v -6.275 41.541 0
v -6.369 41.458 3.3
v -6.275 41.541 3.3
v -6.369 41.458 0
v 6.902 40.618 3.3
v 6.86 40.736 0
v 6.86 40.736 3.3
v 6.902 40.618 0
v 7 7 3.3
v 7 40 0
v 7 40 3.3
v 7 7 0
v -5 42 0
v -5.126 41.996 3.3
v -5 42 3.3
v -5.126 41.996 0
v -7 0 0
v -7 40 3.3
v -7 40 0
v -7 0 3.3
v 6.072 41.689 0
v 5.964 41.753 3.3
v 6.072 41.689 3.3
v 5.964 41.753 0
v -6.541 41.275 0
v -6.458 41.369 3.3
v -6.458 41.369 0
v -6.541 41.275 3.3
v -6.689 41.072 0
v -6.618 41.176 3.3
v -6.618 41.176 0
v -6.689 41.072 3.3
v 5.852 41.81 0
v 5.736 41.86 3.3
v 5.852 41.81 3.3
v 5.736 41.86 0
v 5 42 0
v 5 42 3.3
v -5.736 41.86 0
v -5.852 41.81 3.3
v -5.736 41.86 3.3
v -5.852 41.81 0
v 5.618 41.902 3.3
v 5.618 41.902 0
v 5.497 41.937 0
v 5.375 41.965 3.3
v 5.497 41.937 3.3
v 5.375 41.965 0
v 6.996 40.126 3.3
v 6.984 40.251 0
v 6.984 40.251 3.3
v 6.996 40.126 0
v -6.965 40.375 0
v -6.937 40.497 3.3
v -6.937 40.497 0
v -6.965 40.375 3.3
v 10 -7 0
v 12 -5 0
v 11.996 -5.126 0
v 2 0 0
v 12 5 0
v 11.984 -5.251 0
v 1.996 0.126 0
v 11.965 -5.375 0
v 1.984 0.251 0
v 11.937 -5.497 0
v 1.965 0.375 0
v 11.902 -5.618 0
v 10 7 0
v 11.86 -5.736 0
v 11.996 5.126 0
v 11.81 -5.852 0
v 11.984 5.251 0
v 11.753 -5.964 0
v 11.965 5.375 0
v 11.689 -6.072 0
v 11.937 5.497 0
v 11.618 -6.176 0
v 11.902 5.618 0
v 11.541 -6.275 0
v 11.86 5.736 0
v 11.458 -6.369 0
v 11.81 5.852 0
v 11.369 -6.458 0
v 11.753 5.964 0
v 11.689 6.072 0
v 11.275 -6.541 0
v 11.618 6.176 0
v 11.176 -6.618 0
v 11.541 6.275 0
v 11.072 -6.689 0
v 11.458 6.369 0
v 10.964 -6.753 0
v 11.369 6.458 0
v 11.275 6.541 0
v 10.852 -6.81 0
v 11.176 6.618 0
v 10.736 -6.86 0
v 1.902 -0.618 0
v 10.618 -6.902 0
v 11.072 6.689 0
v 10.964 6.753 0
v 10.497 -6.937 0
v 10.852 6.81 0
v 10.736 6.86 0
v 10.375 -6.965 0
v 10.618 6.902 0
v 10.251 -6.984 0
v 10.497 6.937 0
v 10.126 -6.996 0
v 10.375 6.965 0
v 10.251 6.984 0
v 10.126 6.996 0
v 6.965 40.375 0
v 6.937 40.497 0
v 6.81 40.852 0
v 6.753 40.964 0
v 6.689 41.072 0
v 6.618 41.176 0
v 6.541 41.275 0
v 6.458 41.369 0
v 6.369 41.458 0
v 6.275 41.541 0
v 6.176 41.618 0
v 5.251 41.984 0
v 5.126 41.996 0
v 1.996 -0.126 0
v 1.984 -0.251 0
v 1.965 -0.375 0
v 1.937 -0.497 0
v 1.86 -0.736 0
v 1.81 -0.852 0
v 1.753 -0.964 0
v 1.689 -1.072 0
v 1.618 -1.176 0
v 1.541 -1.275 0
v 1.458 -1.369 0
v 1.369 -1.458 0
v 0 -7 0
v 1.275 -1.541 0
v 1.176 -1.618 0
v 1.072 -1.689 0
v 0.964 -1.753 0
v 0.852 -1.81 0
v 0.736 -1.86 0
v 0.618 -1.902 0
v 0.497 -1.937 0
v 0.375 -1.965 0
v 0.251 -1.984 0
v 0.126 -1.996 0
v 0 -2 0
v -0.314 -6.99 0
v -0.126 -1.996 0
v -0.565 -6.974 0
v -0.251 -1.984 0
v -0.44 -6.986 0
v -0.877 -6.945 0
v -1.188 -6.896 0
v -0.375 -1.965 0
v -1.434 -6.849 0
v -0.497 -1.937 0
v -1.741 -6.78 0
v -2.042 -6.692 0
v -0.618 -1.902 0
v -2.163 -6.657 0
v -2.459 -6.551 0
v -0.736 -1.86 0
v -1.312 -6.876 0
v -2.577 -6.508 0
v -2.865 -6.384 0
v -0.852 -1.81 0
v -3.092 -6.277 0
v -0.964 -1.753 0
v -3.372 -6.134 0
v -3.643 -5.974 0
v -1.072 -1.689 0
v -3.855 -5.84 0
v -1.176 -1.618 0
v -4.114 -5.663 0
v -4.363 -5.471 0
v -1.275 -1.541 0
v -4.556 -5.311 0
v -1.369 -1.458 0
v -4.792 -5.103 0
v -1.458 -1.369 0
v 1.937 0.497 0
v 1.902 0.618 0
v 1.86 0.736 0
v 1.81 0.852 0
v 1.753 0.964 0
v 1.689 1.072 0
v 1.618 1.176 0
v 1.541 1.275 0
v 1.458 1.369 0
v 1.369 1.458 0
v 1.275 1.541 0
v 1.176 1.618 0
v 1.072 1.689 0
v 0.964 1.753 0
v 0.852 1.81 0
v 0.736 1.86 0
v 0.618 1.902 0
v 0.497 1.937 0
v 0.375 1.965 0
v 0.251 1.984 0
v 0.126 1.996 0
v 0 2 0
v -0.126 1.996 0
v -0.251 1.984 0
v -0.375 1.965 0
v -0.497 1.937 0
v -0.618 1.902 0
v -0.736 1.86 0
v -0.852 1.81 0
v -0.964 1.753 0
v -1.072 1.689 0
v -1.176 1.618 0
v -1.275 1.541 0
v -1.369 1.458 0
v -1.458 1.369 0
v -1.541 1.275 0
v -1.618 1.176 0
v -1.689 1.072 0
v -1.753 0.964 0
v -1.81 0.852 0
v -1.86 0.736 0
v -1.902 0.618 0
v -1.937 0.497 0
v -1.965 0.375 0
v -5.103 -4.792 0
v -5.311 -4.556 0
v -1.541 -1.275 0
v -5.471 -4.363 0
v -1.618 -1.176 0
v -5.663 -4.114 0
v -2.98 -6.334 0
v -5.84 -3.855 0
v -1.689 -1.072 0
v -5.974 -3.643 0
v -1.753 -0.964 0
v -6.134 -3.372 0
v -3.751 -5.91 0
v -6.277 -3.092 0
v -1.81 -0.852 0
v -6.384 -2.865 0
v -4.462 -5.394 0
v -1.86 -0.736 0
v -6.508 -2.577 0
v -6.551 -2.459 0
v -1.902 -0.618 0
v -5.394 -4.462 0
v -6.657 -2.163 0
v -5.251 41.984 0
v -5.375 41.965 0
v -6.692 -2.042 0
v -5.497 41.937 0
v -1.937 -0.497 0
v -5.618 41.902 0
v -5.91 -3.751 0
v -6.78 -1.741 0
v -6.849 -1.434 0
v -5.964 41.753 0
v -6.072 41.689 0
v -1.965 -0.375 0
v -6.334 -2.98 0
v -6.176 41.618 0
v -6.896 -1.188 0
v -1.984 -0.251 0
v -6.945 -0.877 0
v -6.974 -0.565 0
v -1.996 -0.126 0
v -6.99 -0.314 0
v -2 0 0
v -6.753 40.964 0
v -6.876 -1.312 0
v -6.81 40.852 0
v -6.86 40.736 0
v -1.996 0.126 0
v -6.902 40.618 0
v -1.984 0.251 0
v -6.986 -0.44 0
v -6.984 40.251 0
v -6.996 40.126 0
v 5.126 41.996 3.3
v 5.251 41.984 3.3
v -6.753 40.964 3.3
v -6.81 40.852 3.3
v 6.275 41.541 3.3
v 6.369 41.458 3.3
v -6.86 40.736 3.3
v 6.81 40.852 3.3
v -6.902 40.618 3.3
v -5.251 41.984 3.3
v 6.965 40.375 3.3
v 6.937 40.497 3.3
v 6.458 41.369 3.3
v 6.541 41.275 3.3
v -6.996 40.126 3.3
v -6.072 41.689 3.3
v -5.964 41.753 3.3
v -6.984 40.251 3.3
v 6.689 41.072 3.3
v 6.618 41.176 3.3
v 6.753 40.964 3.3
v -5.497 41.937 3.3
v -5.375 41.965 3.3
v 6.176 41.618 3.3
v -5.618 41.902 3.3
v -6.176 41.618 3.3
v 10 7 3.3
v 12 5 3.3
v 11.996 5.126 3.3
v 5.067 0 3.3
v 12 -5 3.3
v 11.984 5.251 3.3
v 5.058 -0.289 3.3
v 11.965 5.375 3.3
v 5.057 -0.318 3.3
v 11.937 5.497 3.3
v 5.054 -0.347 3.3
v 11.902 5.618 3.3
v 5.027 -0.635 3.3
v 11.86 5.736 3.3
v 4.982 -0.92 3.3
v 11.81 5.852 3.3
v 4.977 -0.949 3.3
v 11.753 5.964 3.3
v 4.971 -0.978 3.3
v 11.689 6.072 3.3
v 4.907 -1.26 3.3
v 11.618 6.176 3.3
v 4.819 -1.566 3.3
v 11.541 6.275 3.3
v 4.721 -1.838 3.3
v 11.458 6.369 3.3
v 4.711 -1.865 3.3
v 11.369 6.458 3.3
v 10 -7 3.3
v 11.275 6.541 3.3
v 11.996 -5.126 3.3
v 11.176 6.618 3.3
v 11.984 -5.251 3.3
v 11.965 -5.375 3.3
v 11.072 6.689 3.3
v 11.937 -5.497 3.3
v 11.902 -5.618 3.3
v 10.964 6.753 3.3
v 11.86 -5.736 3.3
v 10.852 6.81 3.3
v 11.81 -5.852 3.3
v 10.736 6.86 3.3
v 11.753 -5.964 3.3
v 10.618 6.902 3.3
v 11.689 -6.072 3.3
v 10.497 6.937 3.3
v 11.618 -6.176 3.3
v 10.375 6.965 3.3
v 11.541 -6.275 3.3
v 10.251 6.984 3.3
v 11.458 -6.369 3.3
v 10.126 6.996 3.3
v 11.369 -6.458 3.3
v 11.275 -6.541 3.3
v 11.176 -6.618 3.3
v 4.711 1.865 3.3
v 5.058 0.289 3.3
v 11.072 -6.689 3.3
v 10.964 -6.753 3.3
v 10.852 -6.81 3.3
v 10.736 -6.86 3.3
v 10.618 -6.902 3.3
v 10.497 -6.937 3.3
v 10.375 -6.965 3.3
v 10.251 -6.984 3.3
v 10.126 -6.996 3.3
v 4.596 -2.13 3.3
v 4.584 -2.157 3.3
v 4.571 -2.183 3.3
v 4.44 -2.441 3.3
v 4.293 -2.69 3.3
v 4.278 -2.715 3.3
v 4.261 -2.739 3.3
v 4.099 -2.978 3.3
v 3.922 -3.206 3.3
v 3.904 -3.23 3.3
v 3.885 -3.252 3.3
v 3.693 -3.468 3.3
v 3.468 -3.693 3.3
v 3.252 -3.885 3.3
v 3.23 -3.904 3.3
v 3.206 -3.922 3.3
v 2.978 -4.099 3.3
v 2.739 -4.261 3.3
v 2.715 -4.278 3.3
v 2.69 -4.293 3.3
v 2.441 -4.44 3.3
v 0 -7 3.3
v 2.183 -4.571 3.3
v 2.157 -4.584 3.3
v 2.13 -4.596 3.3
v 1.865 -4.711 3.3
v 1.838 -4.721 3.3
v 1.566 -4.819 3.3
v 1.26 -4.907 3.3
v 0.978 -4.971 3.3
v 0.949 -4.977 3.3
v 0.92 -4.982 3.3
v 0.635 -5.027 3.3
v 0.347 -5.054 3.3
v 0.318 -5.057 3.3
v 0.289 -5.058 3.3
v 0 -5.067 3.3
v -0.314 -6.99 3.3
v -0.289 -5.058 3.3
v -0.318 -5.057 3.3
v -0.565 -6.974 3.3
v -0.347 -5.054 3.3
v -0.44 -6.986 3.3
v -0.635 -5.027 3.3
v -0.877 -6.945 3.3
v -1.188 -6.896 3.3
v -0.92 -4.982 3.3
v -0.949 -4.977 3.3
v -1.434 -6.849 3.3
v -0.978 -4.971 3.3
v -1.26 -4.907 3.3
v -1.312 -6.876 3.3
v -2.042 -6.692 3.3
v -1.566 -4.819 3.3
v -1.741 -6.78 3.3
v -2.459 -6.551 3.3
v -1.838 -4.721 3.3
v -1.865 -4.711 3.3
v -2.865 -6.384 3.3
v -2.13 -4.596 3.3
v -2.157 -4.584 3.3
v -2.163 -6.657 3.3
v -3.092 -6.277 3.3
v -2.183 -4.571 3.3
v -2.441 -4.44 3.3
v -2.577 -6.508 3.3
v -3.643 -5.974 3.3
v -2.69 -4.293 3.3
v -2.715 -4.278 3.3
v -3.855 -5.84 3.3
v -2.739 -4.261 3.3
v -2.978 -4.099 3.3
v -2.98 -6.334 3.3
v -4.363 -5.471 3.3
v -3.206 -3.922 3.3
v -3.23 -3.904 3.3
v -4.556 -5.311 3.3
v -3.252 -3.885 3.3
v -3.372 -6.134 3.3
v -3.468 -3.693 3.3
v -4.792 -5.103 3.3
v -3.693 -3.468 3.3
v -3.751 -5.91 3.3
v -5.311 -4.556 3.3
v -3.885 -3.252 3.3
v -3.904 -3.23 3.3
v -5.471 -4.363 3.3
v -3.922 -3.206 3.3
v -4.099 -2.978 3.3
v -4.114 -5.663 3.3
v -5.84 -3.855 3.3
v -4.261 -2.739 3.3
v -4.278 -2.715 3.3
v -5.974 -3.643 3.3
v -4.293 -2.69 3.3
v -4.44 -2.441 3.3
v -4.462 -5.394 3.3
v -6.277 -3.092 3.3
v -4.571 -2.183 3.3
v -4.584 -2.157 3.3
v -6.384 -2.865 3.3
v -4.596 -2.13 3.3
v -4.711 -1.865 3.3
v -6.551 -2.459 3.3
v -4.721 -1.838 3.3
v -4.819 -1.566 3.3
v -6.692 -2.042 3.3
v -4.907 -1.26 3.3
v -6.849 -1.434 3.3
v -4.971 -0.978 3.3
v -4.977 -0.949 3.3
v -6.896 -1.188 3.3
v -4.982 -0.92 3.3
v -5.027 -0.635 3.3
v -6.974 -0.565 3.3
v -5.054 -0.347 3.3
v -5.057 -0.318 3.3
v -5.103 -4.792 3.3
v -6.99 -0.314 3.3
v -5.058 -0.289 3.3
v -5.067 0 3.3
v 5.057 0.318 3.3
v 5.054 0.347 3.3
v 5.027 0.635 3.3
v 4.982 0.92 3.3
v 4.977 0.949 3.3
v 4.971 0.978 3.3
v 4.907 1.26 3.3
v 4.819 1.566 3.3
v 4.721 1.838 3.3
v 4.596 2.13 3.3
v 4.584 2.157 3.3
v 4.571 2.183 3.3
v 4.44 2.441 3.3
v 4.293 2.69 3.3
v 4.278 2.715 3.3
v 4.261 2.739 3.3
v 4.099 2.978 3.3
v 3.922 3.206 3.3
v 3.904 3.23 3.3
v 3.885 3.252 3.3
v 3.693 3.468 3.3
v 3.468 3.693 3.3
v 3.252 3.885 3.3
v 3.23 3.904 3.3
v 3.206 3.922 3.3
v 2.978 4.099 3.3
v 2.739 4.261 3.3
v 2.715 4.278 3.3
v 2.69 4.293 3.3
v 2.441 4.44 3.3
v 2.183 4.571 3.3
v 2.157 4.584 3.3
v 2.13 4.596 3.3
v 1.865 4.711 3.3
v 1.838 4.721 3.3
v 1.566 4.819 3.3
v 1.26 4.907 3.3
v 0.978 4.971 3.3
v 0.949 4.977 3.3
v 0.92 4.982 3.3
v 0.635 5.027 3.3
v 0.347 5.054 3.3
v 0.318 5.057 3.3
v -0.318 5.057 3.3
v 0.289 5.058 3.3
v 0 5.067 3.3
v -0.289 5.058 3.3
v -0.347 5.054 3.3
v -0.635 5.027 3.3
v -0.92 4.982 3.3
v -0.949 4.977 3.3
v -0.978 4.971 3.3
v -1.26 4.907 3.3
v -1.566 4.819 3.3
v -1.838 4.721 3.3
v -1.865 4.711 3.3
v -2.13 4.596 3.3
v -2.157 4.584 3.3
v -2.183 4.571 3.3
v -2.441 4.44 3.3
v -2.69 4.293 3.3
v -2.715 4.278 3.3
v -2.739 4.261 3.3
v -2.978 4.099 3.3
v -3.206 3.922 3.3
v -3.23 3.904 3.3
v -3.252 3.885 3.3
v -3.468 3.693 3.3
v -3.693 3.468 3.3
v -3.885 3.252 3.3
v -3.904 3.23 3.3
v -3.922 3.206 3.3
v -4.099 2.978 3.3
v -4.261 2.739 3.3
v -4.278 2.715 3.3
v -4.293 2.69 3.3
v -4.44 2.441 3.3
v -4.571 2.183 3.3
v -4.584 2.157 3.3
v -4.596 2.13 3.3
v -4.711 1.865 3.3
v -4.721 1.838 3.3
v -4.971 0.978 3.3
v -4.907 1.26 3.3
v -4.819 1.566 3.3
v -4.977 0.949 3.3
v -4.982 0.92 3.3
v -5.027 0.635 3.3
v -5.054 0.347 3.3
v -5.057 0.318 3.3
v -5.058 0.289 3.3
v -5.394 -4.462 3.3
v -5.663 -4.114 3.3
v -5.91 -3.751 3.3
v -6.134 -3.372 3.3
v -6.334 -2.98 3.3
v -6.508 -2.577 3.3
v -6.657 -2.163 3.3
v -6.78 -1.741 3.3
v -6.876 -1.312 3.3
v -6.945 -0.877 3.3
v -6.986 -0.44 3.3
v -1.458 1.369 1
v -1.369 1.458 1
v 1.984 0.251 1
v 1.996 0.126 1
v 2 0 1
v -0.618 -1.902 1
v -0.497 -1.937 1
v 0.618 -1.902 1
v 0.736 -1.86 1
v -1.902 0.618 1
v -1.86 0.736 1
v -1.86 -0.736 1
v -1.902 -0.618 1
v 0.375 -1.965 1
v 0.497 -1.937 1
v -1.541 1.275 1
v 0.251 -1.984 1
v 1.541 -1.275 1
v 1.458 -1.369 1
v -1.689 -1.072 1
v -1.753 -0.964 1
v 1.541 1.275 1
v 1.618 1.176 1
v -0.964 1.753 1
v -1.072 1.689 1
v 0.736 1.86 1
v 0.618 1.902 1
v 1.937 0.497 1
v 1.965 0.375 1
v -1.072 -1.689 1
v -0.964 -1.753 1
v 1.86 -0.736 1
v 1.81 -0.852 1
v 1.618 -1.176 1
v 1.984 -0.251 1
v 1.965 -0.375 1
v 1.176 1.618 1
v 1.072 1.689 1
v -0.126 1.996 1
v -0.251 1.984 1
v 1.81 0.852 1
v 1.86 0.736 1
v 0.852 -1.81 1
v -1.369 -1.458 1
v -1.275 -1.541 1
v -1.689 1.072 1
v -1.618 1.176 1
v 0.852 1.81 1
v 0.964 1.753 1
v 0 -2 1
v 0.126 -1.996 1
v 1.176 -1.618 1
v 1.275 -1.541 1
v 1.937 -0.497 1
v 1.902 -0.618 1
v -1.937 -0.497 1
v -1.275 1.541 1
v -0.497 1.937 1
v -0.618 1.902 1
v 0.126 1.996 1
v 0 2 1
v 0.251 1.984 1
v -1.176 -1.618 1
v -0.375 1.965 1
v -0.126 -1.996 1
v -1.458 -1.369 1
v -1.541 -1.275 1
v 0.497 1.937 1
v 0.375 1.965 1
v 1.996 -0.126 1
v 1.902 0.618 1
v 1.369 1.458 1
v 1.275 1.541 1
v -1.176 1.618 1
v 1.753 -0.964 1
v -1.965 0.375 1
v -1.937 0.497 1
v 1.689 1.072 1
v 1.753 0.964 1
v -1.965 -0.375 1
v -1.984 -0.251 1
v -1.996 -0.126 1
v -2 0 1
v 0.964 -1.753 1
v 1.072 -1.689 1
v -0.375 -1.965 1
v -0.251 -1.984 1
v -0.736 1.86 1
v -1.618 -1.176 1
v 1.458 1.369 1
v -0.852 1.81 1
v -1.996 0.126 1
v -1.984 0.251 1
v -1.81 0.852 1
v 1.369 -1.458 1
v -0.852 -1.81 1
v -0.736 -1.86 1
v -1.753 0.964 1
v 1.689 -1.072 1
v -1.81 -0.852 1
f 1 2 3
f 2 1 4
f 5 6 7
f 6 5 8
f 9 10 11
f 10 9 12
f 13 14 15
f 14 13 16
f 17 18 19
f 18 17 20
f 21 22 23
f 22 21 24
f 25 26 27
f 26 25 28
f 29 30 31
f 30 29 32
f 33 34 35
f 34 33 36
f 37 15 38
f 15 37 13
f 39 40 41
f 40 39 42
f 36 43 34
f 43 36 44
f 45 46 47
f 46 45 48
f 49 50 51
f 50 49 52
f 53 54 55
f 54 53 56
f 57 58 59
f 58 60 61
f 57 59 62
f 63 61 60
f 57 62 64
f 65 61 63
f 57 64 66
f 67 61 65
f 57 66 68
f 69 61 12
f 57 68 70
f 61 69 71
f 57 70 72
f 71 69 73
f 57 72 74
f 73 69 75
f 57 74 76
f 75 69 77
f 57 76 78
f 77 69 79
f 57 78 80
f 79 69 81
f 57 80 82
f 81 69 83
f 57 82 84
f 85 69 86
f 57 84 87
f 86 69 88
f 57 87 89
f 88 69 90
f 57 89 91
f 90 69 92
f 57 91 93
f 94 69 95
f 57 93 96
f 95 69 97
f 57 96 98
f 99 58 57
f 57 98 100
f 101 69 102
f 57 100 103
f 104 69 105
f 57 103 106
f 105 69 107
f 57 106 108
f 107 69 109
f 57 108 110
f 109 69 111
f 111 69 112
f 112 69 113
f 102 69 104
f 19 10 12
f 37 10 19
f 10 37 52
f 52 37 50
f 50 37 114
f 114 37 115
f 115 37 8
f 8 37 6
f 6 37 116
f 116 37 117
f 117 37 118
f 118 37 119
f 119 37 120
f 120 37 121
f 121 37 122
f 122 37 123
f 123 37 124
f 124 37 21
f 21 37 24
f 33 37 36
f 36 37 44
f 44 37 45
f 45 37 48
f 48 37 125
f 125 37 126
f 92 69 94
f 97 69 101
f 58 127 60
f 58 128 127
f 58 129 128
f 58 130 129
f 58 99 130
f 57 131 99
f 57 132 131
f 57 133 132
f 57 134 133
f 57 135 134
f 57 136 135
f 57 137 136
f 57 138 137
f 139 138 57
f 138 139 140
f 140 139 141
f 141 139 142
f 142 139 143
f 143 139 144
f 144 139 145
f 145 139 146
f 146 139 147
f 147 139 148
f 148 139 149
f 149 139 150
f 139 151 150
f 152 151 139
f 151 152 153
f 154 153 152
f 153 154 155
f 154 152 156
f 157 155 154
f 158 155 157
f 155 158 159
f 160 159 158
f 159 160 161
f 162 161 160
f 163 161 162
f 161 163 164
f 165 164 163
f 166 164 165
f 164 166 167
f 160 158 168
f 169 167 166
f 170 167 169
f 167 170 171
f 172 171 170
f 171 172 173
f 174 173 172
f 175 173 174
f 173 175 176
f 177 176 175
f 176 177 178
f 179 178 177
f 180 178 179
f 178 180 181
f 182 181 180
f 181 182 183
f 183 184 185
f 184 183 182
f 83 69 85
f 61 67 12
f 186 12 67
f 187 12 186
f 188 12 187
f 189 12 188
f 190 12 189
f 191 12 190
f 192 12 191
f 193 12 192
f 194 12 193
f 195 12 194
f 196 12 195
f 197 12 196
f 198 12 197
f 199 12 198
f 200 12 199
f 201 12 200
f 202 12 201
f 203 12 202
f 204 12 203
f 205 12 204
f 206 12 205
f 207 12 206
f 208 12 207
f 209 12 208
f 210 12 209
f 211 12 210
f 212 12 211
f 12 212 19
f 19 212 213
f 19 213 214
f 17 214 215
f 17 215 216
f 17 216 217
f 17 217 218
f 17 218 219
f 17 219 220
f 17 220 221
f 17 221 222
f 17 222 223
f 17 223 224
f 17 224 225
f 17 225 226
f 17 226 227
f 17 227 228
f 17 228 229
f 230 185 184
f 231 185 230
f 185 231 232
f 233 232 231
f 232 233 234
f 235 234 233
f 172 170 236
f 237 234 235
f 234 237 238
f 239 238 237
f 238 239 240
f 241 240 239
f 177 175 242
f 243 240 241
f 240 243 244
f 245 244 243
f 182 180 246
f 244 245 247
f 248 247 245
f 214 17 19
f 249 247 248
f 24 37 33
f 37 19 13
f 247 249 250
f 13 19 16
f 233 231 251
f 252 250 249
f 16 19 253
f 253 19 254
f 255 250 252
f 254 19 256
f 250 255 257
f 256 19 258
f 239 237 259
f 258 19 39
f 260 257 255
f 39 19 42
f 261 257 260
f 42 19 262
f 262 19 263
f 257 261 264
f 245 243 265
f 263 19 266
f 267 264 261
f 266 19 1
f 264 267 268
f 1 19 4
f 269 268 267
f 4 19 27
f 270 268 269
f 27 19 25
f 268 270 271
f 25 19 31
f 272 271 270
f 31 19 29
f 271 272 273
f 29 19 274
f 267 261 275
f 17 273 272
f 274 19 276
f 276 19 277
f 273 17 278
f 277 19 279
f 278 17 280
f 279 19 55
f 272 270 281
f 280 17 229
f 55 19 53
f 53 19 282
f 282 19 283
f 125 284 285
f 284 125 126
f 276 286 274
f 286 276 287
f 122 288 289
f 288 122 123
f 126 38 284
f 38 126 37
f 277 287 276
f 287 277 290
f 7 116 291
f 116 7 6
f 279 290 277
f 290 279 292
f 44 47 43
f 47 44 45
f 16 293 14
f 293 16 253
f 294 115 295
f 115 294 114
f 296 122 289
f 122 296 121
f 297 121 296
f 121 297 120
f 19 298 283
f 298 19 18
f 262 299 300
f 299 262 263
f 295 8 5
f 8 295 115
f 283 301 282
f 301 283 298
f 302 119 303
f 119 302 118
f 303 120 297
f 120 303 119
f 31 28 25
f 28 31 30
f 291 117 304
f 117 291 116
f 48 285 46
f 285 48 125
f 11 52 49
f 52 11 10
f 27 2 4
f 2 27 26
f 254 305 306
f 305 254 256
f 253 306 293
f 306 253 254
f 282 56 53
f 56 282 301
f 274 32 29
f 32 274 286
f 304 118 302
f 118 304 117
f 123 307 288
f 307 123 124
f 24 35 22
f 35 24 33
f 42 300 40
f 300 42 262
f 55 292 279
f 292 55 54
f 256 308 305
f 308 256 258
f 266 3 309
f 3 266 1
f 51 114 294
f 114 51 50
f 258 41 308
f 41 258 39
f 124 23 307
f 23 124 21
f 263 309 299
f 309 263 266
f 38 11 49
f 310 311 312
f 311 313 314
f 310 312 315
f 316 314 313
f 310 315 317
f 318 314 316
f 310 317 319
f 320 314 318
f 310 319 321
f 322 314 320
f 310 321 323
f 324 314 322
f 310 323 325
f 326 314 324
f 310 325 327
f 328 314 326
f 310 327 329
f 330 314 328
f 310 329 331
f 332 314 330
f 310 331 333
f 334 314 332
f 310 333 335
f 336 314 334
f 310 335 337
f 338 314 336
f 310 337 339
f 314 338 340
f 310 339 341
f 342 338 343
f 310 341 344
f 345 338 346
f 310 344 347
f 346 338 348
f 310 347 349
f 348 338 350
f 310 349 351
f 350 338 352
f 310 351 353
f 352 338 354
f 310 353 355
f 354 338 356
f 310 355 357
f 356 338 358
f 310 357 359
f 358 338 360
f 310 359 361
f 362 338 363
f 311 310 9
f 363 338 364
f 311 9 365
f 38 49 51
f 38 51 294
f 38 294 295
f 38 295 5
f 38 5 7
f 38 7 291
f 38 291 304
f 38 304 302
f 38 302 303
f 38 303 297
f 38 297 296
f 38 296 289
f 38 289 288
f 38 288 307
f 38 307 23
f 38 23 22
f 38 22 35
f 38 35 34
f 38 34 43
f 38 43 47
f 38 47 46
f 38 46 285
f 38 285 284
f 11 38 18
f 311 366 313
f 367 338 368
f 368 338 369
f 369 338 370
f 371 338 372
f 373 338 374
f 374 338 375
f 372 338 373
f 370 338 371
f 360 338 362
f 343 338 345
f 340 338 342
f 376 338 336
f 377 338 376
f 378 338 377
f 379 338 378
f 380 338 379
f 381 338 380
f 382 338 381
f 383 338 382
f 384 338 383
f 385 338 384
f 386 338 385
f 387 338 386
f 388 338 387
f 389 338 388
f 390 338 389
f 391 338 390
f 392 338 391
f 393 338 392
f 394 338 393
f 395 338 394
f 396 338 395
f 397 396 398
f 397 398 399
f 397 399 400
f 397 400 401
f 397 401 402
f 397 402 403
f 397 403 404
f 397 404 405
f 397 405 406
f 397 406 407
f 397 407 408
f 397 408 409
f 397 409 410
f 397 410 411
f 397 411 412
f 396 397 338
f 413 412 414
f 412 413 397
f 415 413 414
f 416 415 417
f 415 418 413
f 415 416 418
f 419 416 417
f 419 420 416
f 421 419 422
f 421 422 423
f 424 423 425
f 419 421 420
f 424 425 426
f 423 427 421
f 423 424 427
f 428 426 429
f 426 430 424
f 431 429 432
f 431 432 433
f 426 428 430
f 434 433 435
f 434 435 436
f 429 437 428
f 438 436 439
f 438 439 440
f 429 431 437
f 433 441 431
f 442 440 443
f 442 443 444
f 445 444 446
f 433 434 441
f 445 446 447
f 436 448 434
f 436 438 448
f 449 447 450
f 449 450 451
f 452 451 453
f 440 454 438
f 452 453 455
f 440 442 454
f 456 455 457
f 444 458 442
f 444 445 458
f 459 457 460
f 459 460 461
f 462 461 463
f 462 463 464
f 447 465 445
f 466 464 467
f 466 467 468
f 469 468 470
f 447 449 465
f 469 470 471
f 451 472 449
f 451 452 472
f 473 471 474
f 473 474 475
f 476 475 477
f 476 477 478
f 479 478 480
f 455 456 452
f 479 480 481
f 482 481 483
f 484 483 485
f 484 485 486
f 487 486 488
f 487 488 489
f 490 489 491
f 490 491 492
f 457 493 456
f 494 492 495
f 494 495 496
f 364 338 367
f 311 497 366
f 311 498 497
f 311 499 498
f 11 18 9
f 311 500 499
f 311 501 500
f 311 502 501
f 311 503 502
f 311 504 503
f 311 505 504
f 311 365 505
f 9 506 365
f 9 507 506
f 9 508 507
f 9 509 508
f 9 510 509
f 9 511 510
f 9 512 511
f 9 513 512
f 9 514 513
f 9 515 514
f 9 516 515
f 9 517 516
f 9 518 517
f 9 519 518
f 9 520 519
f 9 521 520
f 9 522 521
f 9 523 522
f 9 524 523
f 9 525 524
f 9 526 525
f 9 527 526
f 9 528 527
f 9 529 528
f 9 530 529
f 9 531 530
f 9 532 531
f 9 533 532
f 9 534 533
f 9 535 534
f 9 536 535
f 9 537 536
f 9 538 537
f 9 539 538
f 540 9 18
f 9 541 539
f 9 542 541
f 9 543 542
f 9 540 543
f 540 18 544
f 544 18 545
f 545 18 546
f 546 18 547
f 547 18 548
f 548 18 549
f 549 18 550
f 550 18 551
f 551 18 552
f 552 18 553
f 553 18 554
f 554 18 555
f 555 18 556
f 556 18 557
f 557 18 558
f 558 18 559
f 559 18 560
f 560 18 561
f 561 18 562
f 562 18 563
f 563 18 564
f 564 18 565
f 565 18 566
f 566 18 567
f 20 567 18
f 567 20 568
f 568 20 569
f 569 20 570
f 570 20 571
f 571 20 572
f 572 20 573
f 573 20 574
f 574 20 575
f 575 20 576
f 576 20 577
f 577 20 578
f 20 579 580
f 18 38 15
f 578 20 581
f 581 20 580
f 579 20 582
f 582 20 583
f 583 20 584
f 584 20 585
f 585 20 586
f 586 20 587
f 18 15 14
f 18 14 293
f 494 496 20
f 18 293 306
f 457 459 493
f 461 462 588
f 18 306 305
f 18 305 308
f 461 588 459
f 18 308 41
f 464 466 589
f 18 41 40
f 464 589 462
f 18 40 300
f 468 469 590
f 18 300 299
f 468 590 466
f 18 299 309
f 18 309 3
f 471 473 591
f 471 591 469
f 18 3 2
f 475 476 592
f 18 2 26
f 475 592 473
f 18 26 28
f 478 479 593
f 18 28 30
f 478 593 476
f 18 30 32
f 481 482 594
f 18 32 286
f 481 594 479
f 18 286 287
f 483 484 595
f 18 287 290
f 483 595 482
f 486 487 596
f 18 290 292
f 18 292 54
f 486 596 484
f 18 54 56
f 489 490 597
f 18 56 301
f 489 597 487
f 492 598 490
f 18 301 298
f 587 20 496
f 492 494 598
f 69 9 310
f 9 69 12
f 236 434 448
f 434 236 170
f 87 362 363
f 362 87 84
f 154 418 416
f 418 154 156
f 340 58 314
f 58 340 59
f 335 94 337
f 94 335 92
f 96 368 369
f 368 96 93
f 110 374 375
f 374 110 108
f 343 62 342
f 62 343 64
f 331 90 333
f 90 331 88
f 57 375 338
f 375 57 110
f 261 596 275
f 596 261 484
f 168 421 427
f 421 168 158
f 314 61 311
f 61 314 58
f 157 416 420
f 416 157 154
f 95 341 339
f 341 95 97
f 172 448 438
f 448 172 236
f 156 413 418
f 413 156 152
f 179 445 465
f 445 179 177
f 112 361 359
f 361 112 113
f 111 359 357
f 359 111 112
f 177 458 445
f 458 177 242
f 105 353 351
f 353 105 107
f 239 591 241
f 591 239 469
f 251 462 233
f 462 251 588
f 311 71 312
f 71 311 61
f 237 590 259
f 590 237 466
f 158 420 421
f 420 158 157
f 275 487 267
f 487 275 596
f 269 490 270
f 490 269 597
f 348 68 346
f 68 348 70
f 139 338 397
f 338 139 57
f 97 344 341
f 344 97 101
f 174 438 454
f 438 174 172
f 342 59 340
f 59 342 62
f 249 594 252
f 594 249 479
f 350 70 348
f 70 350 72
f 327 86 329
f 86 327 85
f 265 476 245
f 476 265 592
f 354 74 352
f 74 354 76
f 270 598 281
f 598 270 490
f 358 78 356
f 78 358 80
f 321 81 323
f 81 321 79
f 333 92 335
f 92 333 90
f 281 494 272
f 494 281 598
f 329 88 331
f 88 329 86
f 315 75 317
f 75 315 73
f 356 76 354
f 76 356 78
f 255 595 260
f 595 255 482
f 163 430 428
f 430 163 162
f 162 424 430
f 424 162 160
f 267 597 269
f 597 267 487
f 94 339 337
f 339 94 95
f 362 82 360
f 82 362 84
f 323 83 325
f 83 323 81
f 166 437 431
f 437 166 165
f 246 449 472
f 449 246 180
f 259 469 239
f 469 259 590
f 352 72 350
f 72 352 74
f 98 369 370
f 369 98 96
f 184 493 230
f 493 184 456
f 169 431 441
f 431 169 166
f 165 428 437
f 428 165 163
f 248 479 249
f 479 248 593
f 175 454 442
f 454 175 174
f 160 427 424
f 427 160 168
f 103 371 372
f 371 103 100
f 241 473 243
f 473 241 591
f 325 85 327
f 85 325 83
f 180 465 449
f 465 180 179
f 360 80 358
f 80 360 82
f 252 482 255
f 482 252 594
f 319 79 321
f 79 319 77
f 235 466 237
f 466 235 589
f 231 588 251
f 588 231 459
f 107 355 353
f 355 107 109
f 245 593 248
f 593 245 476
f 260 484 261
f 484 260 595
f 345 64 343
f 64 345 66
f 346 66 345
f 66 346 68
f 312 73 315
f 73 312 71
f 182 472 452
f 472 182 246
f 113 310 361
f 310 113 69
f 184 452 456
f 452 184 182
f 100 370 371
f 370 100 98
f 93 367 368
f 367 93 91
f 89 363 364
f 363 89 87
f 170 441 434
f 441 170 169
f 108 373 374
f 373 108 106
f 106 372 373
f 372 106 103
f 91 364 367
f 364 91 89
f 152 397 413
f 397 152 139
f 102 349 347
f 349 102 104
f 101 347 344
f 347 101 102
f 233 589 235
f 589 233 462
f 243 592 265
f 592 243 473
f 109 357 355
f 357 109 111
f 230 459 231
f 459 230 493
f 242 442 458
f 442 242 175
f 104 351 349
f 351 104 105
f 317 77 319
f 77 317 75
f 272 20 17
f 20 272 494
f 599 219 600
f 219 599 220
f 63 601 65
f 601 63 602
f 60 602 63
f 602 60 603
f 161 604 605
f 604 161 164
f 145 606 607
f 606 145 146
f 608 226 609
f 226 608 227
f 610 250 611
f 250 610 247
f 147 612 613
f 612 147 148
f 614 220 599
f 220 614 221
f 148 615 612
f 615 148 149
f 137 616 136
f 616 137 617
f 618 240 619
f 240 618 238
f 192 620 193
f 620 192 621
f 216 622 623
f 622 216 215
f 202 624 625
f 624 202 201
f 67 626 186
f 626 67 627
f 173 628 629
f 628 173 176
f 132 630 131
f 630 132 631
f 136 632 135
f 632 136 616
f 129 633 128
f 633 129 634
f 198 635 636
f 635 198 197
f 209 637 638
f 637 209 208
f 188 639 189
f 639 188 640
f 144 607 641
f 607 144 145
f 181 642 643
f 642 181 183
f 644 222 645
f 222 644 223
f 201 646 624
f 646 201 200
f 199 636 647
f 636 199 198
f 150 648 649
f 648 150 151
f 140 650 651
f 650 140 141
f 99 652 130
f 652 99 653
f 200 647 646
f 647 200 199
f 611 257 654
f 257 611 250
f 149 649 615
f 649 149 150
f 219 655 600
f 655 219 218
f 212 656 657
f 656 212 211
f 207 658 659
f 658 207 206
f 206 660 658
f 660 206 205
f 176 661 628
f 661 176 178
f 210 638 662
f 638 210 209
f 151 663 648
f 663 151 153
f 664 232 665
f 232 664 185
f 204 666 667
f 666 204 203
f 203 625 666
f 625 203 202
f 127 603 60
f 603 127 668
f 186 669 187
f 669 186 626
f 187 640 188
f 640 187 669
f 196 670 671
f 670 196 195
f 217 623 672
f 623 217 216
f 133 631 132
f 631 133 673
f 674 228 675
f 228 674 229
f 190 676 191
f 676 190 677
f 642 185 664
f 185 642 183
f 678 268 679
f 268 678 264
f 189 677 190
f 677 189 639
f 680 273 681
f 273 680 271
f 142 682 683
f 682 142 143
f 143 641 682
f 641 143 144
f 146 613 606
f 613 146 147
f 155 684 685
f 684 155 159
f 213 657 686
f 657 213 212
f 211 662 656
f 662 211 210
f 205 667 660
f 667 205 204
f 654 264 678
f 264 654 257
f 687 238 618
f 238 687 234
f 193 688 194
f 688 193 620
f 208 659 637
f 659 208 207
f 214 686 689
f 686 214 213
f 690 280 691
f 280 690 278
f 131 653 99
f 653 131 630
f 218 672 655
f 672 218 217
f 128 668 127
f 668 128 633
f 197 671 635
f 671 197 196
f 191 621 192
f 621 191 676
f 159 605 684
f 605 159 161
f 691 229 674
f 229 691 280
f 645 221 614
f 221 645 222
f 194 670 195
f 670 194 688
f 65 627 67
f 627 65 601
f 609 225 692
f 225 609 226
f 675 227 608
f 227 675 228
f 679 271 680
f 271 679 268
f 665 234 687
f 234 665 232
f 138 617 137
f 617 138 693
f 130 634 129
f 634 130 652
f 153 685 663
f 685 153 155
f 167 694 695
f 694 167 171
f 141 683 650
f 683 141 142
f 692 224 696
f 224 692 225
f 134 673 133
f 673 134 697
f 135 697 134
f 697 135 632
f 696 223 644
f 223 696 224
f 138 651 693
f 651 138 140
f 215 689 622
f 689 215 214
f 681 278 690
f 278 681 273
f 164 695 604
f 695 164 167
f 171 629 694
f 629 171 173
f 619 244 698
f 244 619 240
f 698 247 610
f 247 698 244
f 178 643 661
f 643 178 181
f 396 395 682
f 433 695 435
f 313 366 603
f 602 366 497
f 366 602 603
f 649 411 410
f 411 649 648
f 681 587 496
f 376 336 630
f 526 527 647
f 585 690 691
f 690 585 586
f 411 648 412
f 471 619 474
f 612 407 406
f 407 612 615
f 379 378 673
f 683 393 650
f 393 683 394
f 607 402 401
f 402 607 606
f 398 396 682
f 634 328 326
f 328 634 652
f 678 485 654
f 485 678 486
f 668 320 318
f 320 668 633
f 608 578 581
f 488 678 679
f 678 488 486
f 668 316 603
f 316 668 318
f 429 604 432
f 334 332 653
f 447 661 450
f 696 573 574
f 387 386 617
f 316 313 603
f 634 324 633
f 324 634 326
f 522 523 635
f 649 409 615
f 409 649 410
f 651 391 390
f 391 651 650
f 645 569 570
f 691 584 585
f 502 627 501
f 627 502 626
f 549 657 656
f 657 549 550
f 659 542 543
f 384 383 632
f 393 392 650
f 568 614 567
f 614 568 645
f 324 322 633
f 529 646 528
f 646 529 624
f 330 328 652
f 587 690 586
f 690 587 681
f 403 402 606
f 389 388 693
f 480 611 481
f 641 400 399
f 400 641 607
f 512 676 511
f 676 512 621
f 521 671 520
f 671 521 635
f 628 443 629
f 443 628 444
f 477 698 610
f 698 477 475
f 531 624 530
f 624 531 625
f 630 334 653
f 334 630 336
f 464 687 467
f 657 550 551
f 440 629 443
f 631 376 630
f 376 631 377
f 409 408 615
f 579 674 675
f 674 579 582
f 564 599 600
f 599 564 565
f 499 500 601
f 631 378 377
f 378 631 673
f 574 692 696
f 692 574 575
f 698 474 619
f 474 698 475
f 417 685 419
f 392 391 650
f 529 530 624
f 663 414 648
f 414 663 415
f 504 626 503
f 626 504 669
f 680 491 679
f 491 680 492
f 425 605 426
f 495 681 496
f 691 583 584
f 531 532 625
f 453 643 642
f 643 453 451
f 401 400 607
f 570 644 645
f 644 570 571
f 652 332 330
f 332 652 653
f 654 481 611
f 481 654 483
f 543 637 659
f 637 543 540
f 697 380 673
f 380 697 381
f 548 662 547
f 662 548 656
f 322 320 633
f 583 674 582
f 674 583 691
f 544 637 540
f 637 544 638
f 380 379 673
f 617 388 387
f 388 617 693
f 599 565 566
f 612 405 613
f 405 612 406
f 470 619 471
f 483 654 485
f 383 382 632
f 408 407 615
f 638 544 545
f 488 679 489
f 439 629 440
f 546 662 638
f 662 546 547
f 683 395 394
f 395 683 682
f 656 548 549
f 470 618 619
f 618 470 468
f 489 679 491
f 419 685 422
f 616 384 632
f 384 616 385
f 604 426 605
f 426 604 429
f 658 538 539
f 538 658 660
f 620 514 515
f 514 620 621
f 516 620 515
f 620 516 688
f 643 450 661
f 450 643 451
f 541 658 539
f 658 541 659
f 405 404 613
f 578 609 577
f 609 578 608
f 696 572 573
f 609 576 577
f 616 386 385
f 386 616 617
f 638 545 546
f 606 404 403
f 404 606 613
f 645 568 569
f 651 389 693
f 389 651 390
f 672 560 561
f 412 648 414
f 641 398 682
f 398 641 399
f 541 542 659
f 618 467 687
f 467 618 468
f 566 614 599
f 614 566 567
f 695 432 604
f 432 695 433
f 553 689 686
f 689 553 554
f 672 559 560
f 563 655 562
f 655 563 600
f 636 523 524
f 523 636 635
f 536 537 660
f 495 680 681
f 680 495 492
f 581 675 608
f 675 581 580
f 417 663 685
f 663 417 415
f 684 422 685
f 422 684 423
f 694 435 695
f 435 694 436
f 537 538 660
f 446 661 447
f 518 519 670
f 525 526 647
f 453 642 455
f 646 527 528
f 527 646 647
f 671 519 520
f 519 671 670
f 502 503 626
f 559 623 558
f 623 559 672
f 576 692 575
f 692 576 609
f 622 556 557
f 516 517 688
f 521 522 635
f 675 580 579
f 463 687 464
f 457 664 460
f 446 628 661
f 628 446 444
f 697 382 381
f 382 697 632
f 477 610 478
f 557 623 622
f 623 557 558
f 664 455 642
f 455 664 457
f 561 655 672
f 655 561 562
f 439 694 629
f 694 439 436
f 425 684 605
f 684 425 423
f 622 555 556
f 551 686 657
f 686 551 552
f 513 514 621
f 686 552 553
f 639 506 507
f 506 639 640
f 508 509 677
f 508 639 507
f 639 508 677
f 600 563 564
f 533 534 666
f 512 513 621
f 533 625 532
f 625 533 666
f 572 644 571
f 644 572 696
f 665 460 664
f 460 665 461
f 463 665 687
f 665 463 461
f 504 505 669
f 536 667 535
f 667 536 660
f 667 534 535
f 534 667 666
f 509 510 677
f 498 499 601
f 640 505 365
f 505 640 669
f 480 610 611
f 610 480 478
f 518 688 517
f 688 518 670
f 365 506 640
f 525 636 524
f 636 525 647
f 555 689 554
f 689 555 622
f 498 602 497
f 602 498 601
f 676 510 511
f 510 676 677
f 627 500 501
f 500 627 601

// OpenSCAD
$fn = 100;

difference() {
  
  minkowski() {
    union() {
      cylinder(2.3, 5, 5);
      
      translate([-5, 0, 0])
        cube([10, 40, 2.3]);
      
      translate([0, -5, 0])
        cube([10, 10, 2.3]);
    }
    cylinder(1, 2, 2);
  }
  
  translate([0, 0, -1])
    cylinder(10, 2, 2);
  
  translate([0, 0, 1])
    cylinder(3, 2, 6);

}
